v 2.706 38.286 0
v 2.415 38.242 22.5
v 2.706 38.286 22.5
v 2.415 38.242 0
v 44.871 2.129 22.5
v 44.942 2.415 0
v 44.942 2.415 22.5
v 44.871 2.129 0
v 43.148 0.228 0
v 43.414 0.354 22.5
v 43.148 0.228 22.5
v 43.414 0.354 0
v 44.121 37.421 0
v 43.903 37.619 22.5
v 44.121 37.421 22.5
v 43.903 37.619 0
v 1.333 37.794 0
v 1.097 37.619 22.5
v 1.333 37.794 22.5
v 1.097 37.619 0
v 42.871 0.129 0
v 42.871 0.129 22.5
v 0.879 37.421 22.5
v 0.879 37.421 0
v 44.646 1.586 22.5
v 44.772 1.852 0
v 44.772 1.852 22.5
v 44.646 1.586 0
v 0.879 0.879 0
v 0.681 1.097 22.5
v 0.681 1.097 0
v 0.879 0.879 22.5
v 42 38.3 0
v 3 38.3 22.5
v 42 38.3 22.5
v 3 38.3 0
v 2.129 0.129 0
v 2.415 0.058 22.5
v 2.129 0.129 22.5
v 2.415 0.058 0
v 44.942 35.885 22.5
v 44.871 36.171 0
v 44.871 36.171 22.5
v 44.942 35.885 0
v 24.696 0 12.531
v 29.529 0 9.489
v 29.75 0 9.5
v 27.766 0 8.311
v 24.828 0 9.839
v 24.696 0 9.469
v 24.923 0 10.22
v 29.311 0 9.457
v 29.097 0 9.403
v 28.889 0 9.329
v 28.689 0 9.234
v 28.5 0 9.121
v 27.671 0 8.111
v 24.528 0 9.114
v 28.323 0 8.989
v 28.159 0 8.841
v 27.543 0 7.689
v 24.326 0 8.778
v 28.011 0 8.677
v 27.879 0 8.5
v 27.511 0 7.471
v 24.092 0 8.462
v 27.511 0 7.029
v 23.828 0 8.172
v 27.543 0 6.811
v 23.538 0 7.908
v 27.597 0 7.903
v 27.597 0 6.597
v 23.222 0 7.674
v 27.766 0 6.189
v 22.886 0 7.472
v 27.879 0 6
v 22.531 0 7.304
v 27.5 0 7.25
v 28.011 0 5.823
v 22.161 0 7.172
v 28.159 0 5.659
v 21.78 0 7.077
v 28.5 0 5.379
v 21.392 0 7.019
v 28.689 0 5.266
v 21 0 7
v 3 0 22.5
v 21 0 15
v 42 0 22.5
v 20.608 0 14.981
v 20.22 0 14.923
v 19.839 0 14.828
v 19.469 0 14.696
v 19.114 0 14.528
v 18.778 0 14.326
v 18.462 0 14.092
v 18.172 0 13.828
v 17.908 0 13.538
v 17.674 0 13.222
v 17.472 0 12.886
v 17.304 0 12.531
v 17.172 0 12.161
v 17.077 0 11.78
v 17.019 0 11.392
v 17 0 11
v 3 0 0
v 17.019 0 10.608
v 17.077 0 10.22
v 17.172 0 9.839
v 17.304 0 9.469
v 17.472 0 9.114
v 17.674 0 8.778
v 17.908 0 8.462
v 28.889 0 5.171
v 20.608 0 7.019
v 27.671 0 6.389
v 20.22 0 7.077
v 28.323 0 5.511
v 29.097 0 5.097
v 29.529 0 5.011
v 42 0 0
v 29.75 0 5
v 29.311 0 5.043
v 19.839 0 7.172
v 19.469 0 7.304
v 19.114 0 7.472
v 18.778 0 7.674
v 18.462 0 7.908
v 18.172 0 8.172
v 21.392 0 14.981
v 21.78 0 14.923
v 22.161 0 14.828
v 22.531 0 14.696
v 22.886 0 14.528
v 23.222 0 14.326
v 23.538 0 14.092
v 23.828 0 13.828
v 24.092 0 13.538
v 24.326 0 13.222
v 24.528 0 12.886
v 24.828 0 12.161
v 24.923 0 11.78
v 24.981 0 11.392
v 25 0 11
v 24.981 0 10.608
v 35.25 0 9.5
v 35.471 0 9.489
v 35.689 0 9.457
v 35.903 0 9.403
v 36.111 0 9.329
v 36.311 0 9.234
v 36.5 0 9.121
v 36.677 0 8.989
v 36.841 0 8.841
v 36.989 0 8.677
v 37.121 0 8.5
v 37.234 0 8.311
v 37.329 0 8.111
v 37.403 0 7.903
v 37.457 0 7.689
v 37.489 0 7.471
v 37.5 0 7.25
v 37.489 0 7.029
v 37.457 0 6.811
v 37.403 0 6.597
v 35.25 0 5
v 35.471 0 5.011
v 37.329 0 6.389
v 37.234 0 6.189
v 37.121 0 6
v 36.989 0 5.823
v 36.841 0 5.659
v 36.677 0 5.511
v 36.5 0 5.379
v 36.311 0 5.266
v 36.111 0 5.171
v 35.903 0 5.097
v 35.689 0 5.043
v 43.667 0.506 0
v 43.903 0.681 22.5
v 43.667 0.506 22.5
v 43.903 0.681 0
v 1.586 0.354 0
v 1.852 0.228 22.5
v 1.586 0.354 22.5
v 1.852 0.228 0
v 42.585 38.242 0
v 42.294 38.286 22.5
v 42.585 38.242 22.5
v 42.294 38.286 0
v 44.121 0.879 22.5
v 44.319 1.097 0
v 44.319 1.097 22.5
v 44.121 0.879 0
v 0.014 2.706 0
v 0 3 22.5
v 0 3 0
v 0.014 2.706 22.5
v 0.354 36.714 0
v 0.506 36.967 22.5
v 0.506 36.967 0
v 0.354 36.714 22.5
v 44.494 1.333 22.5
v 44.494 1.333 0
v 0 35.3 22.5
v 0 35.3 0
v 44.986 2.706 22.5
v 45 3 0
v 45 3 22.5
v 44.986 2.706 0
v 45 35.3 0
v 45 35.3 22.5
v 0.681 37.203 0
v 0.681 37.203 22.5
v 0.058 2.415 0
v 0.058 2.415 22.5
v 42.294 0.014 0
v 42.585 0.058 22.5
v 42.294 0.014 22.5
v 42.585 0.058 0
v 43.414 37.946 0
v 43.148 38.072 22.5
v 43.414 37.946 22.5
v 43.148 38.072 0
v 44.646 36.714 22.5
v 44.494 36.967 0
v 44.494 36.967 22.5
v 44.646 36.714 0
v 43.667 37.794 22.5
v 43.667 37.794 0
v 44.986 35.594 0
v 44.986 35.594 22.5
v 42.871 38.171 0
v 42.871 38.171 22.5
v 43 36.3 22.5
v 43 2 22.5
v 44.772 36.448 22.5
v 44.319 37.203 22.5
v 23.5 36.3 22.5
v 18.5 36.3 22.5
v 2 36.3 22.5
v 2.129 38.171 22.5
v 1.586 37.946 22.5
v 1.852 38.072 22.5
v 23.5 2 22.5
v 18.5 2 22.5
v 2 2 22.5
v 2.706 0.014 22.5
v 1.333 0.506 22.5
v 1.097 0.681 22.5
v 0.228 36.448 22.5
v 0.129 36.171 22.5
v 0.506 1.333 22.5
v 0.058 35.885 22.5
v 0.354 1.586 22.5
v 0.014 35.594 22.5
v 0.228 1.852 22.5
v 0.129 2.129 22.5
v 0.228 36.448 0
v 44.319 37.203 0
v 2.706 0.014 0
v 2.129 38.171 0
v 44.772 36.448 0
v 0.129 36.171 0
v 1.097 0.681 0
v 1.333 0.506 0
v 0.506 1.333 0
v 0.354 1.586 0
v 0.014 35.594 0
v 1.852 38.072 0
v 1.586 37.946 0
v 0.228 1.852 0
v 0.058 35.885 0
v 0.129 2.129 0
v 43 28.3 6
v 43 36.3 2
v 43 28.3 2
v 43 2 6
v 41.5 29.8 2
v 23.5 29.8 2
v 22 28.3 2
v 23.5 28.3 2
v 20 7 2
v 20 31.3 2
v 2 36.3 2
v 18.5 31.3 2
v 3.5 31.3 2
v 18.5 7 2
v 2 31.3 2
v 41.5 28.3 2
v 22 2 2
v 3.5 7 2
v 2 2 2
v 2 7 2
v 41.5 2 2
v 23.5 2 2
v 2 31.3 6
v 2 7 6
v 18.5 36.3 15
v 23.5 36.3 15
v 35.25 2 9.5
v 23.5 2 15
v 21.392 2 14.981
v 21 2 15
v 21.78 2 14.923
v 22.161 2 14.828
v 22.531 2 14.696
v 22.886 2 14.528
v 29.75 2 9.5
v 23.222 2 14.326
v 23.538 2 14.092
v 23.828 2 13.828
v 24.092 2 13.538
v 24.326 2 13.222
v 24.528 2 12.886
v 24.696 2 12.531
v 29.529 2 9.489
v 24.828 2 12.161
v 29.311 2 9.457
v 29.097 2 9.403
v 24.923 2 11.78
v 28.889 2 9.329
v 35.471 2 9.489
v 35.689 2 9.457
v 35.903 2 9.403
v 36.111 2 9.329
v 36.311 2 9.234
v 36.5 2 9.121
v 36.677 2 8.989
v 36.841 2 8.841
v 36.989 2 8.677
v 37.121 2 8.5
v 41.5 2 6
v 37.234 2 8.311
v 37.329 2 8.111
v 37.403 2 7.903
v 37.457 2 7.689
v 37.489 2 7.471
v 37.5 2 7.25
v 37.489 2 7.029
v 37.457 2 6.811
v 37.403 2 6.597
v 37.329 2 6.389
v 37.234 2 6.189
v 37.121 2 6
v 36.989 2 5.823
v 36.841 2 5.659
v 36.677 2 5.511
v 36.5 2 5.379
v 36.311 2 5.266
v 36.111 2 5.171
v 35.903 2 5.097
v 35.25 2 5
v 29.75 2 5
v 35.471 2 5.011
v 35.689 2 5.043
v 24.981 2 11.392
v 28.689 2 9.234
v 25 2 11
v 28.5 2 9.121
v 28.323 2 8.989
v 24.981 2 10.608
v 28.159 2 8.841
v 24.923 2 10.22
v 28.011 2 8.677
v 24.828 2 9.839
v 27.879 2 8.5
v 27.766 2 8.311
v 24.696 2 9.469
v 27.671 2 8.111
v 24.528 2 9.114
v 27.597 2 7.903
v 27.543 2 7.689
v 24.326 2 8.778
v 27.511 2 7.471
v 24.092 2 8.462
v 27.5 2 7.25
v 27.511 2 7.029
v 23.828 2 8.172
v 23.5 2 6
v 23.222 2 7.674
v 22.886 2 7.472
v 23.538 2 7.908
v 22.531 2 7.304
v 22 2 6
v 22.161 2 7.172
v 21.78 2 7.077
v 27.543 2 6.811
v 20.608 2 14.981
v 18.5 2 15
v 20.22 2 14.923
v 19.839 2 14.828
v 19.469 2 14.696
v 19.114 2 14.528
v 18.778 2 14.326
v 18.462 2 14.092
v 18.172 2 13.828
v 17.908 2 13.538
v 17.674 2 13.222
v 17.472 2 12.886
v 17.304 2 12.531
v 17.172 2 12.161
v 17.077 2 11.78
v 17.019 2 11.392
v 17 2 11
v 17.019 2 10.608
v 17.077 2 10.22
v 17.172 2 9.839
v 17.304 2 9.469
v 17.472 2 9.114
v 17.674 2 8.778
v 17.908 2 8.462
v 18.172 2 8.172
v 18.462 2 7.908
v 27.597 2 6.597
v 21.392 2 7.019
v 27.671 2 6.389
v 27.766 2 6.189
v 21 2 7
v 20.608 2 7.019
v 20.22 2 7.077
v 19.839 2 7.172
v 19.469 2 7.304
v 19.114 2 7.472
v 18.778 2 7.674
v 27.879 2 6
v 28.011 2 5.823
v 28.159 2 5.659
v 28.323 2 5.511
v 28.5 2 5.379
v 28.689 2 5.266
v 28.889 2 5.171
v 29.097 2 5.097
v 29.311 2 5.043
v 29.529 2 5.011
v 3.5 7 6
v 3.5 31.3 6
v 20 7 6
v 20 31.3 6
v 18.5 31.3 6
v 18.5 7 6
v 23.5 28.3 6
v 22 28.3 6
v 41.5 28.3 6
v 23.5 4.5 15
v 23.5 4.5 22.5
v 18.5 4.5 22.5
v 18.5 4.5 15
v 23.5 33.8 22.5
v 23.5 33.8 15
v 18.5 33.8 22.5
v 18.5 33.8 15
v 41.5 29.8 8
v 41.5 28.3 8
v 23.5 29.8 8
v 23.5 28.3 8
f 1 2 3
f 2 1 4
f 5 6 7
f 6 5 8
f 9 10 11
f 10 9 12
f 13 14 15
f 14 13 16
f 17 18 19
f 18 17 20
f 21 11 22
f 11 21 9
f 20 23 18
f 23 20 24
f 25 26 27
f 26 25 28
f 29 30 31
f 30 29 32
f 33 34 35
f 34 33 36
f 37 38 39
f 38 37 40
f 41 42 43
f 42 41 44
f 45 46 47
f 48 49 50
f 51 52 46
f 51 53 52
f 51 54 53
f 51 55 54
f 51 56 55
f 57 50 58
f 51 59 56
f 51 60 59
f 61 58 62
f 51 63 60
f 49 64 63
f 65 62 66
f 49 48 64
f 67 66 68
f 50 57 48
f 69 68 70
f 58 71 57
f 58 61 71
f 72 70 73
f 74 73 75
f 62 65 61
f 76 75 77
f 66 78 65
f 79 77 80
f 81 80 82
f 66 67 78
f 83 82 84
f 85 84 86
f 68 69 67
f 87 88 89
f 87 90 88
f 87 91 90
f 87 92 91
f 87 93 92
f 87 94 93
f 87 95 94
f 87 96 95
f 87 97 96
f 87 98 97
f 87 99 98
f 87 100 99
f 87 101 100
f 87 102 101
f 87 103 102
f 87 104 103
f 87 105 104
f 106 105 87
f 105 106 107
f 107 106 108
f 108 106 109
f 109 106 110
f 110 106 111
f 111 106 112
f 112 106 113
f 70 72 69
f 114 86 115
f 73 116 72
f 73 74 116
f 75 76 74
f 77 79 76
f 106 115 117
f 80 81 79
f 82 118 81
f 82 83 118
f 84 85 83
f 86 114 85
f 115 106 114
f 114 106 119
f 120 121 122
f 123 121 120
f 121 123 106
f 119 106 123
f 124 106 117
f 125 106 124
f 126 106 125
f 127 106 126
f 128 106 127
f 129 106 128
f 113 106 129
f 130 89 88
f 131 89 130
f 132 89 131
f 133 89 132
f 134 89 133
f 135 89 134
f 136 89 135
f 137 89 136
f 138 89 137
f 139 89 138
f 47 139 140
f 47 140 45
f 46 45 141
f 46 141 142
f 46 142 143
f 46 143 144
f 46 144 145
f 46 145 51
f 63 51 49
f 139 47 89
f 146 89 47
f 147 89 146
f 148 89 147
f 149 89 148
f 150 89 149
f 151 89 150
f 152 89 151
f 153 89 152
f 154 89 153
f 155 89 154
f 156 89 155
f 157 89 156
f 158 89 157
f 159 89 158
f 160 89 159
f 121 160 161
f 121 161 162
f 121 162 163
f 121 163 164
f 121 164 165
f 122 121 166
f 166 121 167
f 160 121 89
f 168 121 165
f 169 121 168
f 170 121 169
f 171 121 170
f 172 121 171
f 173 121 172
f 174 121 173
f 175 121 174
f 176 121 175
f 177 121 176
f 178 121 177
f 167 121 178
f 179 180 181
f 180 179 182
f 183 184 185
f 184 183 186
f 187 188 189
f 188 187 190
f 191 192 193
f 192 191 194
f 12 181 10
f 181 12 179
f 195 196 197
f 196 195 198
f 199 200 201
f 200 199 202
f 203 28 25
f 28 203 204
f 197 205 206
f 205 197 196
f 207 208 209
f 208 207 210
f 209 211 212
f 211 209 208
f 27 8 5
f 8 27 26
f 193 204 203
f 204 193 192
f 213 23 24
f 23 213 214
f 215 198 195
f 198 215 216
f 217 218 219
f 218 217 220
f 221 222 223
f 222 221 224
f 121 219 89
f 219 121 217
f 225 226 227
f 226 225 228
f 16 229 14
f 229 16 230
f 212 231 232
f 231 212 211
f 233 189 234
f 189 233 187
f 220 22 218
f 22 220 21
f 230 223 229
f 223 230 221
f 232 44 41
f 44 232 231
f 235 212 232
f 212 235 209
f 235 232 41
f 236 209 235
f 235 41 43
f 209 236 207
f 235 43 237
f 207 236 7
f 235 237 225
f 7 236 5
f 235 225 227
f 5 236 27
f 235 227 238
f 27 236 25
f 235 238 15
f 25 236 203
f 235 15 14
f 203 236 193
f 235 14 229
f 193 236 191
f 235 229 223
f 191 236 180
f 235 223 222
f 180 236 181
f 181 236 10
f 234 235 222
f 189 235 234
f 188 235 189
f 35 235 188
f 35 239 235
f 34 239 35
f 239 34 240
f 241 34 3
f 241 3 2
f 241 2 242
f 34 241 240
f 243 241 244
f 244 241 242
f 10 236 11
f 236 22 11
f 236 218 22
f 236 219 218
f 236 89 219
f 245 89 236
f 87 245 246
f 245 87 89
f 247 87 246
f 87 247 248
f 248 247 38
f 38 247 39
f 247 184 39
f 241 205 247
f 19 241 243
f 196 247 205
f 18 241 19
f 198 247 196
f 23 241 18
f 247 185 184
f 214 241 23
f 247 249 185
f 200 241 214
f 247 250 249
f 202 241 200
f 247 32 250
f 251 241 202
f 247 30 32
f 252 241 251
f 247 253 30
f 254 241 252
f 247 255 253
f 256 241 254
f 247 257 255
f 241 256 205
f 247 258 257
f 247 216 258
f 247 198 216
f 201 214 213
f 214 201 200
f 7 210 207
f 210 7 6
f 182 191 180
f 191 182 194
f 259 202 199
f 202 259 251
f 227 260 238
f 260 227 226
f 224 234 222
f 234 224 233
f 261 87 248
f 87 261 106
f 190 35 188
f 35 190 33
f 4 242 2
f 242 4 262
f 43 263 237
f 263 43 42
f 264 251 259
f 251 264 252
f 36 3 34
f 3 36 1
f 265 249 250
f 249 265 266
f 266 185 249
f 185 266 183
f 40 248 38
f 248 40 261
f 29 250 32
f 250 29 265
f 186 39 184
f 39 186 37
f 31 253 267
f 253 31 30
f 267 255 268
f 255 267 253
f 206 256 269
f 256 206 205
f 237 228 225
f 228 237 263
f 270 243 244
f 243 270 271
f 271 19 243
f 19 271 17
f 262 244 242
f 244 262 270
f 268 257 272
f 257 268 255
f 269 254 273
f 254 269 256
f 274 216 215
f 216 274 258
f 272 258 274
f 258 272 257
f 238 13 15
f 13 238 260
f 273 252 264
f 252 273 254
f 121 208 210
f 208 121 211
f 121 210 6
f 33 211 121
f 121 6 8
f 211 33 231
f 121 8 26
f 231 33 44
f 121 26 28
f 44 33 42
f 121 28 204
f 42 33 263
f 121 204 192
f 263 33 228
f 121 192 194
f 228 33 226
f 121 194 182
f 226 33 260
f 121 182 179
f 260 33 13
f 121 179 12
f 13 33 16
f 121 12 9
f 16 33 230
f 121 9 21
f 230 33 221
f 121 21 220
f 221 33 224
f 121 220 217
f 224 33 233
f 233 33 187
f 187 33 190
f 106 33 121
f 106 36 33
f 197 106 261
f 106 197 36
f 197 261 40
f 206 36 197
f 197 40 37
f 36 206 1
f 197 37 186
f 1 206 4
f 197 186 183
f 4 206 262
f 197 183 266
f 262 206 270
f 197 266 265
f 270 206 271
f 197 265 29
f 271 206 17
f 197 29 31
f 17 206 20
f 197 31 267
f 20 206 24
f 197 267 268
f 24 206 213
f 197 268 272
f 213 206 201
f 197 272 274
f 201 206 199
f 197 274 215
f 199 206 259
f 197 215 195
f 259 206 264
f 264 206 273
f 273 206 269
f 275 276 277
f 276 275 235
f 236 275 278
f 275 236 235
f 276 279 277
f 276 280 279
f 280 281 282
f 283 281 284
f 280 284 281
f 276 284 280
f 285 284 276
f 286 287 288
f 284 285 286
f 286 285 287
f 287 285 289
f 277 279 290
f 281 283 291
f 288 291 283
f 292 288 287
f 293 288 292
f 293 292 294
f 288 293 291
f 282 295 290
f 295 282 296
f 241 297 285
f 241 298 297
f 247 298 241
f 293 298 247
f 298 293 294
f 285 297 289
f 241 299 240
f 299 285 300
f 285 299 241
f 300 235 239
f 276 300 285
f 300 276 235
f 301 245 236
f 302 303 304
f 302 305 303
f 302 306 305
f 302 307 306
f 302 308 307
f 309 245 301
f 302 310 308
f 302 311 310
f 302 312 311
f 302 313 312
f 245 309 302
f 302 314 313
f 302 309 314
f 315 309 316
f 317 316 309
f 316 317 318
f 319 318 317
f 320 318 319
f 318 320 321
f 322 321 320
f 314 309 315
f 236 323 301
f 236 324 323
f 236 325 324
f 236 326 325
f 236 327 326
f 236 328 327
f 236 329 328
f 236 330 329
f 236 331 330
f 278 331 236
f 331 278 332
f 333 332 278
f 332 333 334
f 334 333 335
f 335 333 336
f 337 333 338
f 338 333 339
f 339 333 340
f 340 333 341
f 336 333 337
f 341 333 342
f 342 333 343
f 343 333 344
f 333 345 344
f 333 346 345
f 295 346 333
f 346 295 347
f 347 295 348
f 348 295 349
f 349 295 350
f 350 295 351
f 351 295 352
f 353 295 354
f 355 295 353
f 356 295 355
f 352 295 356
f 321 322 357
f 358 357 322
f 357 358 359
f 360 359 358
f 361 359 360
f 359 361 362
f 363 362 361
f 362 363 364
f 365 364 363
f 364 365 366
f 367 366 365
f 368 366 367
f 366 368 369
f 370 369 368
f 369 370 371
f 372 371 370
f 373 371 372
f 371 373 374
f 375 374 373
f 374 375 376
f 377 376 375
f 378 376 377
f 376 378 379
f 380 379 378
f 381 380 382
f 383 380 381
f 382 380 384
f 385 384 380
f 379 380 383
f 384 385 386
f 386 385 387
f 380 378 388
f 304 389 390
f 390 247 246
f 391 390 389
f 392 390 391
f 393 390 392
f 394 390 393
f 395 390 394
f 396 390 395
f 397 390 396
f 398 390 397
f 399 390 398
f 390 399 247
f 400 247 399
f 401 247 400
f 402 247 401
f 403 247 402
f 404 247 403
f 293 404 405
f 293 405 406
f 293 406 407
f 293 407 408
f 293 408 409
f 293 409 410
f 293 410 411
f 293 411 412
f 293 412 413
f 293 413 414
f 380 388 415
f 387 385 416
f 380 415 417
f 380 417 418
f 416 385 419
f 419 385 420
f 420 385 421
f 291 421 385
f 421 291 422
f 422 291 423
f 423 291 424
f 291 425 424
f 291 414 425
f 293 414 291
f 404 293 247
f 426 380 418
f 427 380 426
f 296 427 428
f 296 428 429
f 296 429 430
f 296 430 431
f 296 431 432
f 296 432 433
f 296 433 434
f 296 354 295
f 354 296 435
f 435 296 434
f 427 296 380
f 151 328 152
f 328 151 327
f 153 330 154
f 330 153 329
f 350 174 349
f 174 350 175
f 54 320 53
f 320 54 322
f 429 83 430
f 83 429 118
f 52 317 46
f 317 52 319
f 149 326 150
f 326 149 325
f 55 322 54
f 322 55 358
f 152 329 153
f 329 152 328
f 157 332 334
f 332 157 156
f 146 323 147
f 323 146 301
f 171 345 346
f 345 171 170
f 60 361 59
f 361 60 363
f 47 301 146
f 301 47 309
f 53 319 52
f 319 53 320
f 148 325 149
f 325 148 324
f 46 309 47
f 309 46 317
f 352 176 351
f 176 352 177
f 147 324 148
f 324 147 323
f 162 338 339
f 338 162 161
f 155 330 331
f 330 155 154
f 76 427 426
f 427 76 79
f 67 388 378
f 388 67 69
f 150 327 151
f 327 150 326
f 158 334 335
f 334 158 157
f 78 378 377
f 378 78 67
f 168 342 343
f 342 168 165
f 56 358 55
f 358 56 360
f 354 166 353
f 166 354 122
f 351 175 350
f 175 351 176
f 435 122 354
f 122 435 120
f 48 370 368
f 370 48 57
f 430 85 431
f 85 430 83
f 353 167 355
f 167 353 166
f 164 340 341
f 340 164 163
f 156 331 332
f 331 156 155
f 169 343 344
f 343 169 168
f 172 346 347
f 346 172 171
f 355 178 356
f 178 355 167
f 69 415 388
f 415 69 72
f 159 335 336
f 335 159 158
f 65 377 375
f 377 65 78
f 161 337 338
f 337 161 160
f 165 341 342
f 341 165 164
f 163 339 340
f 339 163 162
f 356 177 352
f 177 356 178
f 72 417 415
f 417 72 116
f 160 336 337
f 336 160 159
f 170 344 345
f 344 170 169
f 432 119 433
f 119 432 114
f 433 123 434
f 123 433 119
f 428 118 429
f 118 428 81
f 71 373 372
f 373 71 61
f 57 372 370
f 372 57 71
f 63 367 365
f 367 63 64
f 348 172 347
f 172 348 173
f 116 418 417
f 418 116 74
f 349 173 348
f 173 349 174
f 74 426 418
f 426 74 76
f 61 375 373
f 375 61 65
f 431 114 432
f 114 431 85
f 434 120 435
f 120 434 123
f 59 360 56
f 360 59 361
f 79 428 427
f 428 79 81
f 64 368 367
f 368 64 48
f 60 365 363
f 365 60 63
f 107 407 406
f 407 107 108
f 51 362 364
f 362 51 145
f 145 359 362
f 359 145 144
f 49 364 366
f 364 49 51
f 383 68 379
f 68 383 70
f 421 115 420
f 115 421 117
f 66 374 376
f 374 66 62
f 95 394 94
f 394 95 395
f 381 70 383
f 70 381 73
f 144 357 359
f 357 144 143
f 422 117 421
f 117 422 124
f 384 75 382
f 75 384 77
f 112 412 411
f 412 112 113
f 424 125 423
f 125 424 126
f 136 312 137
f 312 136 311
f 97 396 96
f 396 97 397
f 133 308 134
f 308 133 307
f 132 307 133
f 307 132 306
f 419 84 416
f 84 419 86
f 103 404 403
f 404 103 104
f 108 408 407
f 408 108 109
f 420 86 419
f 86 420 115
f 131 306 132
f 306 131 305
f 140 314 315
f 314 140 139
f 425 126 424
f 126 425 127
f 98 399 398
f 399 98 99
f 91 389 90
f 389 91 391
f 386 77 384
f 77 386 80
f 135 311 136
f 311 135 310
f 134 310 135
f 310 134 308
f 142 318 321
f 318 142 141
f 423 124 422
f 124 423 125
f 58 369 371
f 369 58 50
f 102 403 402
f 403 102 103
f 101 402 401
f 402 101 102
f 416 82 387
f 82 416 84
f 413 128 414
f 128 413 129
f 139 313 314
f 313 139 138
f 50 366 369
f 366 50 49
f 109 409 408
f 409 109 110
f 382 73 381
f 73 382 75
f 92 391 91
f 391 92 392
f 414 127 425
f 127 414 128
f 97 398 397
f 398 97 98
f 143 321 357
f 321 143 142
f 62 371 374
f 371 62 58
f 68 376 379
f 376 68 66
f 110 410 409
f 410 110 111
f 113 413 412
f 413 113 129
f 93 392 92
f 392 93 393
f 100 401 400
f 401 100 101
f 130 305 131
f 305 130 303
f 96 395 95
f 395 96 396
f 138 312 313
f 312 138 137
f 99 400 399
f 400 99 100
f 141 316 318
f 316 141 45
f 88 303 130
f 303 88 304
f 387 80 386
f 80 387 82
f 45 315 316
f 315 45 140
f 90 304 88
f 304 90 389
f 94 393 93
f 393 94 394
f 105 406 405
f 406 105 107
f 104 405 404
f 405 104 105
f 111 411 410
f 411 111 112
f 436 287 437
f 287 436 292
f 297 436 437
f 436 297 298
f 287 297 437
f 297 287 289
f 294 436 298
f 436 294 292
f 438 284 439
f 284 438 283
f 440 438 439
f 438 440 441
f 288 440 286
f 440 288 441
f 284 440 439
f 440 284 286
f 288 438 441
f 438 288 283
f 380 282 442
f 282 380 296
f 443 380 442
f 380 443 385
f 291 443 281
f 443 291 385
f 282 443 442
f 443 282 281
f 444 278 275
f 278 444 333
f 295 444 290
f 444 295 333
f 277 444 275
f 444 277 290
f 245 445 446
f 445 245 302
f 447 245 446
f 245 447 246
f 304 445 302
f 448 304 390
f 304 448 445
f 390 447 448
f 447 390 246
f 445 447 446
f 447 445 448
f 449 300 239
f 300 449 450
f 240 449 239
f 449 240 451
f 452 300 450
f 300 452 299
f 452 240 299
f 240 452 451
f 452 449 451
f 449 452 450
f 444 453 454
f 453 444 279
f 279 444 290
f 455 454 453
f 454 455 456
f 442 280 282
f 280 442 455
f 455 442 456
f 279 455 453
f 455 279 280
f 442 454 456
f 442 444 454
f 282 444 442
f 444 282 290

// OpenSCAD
// =======================================================
// ENCLOSURE ULTRA-COMPACTA V16.4 - FURO 8MM CENTRALIZADO OK
// =======================================================

$fn = 64; // Alta resolução para furos e encaixes

// --- PARÂMETROS DA CAIXA ---
espessura_parede = 2.0;
folga_encaixe = 0.3; // Tolerância para encaixe suave
vao_central = 2.0; // Distância entre as duas placas em pé
raio_canto = 3.0; // Raio de arredondamento dos cantos externos

// --- ESPAÇOS INTERNOS DOS TRILHOS (GUIA POR PRESSÃO) ---
espaco_trilho_fonte = 15.0; // Espaço exato interno livre entre os trilhos da fonte
espaco_trilho_esp = 18.0;   // Espaço exato interno livre entre os trilhos da ESP32

// --- DIMENSÕES DAS PLACAS ---
fonte_altura = 20.0 + folga_encaixe; // Altura em pé: 20.3 mm
esp_altura = 18.0 + folga_encaixe;   // Altura em pé: 18.3 mm

fonte_profundo = 34.0 + folga_encaixe; // 34.3 mm
esp_profundo = 26.0 + folga_encaixe;  // 26.3 mm

// --- CÁLCULO DE LARGURA DOS TRILHOS NA BASE ---
aba_trilho = 1.5; // Espessura da parede do trilho
largura_total_trilho_fonte = espaco_trilho_fonte + (aba_trilho * 2); // 18.0 mm
largura_total_trilho_esp = espaco_trilho_esp + (aba_trilho * 2);     // 21.0 mm

// --- DIMENSÕES INTERNAS TOTAIS ---
interno_L = largura_total_trilho_fonte + vao_central + largura_total_trilho_esp; // ~41.0 mm
interno_P = max(fonte_profundo, esp_profundo); // 34.3 mm

// --- ALTURA AJUSTADA PARA COMPENSAR A TAMPA MACIÇA ---
interno_A = 20.5; 
externo_A = interno_A + espessura_parede; // 22.5 mm de altura externa da caixa base

// --- DIMENSÕES EXTERNAS TOTAIS ---
externo_L = interno_L + (espessura_parede * 2);
externo_P = interno_P + (espessura_parede * 2);

// --- COORDENADAS DE ANCORAGEM (Placas em Pé) ---
fonte_X = espessura_parede;
esp_X = externo_L - espessura_parede - largura_total_trilho_esp;

centro_vao_X = espessura_parede + largura_total_trilho_fonte + (vao_central / 2);

// --- CONFIGURAÇÃO DE PARAFUSOS M2 ---
m2_diametro = 2.0;
m2_profundidade = 6.0;
boss_diametro = 5.0; 
boss_altura_frontal = m2_profundidade + 1.5; // 7.5 mm

// =======================================================
// CONTROLE DE VISUALIZAÇÃO
// =======================================================
// Mude para 'false' para gerar a Caixa Base ou 'true' para gerar a Tampa
visualizar_tampa = false; 

if (visualizar_tampa) {
    tampa();
} else {
    caixa_base();
}

// =======================================================
// MÓDULOS AUXILIARES
// =======================================================

// Gera um cubo com cantos arredondados no plano X-Y
module cubo_arredondado(l, p, a, r) {
    translate([r, r, 0])
    minkowski() {
        cube([l - 2*r, p - 2*r, a - 0.1]);
        cylinder(r=r, h=0.1);
    }
}

// Gera trilhos guia laterais onde a placa desliza pelo meio até tocar o fundo
module trilhos_guia_lateral(espaco_interno, profundidade, altura_guia) {
    // Guia Esquerda
    cube([aba_trilho, profundidade, altura_guia]);
    // Guia Direita
    translate([aba_trilho + espaco_interno, 0, 0])
    cube([aba_trilho, profundidade, altura_guia]);
}

// =======================================================
// MÓDULOS DO PROJETO
// =======================================================

module caixa_base() {
    difference() {
        // 1. Corpo Externo Maciço ARREDONDADO
        cubo_arredondado(externo_L, externo_P, externo_A, raio_canto);
        
        // 2. Cavidade Interna Principal (Totalmente desimpedida até o fundo)
        translate([espessura_parede, espessura_parede, espessura_parede])
        cube([interno_L, interno_P, interno_A + 1]);
        
        // 3. Furo USB-C Realístico Arredondado (Horizontal)
        usb_L_folga = 10.0;
        usb_A_folga = 4.5;
        
        pos_usb_x = esp_X + (largura_total_trilho_esp / 2);
        pos_usb_z_centro = espessura_parede + 3.0 + (usb_A_folga / 2); 
        
        translate([pos_usb_x, -1, pos_usb_z_centro])
        rotate([-90, 0, 0]) 
        furo_usbc_perfil(usb_L_folga, usb_A_folga, espessura_parede + 2);
        
        // 4. Furo Frontal de 8mm para Passagem de Fios
        // AJUSTADO: Posicionado para ficar o mais alto possível, iniciando imediatamente abaixo do boss
        pos_furo_8mm_z = (externo_A - boss_altura_frontal) - 4.0; // 11.0 mm (centro perfeito)
        translate([centro_vao_X, -1, pos_furo_8mm_z])
        rotate([-90, 0, 0])
        cylinder(d=8, h=espessura_parede + 3);
        
        // 5. Furos Guia M2 dentro dos Bosses (Cego com 6mm de profundidade)
        translate([centro_vao_X, espessura_parede + (boss_diametro/2) - 1, externo_A - m2_profundidade])
        cylinder(d=m2_diametro, h=m2_profundidade + 1);
        
        translate([centro_vao_X, externo_P - espessura_parede - (boss_diametro/2) + 1, externo_A - m2_profundidade])
        cylinder(d=m2_diametro, h=m2_profundidade + 1);
    }
 
    // 6. Bosses Suspensos para os parafusos M2
    translate([centro_vao_X - (boss_diametro/2), espessura_parede, externo_A - boss_altura_frontal])
    cube([boss_diametro, boss_diametro/2, boss_altura_frontal]);
    
    translate([centro_vao_X - (boss_diametro/2), externo_P - espessura_parede - (boss_diametro/2), externo_A - boss_altura_frontal])
    cube([boss_diametro, boss_diametro/2, boss_altura_frontal]);
    
    // 7. Trilhos Guia de Encaixe por Pressão
    // TRILHO DA FONTE: Reduzido 5mm na frente e 5mm atrás (comprimento = fonte_profundo - 10)
    pos_fonte_Y = espessura_parede + (interno_P - fonte_profundo) + 5.0;
    comp_trilho_fonte = fonte_profundo - 10.0;
    translate([fonte_X, pos_fonte_Y, espessura_parede]) 
        trilhos_guia_lateral(espaco_trilho_fonte, comp_trilho_fonte, 4.0);
        
    // TRILHO DA ESP32: Mantido na profundidade total de sua placa
    translate([esp_X, espessura_parede, espessura_parede]) 
        trilhos_guia_lateral(espaco_trilho_esp, esp_profundo, 4.0);

    // Batente traseiro da ESP: impede a placa de escorregar para o vão atrás
    batente_esp_espessura = 1.5;
    batente_esp_altura = 6.0;
    translate([
        esp_X + aba_trilho,
        espessura_parede + esp_profundo,
        espessura_parede
    ])
    cube([espaco_trilho_esp, batente_esp_espessura, batente_esp_altura]);
}

module furo_usbc_perfil(largura, altura, profundidade) {
    raio = altura / 2;
    distancia_centros = largura - altura;
    hull() {
        translate([-distancia_centros/2, 0, 0])
        cylinder(r=raio, h=profundidade);
        translate([distancia_centros/2, 0, 0])
        cylinder(r=raio, h=profundidade);
    }
}

module tampa() {
    difference() {
        // Tampa simplificada: totalmente maciça por baixo (plana), com cantos arredondados
        cubo_arredondado(externo_L, externo_P, espessura_parede, raio_canto);
        
        // Furo Passante M2 Frontal na Tampa
        translate([centro_vao_X, espessura_parede + (boss_diametro/2) - 1, -1]) {
            cylinder(d=2.4, h=espessura_parede + 2);
            translate([0,0, espessura_parede - 1.2]) 
            cylinder(d1=2.4, d2=4.2, h=1.4); 
        }
 
        // Furo M2 Traseiro na Tampa
        translate([centro_vao_X, externo_P - espessura_parede - (boss_diametro/2) + 1, -1]) {
            cylinder(d=2.4, h=espessura_parede + 2);
            translate([0,0, espessura_parede - 1.2]) 
            cylinder(d1=2.4, d2=4.2, h=1.4); 
        }
    }
}
